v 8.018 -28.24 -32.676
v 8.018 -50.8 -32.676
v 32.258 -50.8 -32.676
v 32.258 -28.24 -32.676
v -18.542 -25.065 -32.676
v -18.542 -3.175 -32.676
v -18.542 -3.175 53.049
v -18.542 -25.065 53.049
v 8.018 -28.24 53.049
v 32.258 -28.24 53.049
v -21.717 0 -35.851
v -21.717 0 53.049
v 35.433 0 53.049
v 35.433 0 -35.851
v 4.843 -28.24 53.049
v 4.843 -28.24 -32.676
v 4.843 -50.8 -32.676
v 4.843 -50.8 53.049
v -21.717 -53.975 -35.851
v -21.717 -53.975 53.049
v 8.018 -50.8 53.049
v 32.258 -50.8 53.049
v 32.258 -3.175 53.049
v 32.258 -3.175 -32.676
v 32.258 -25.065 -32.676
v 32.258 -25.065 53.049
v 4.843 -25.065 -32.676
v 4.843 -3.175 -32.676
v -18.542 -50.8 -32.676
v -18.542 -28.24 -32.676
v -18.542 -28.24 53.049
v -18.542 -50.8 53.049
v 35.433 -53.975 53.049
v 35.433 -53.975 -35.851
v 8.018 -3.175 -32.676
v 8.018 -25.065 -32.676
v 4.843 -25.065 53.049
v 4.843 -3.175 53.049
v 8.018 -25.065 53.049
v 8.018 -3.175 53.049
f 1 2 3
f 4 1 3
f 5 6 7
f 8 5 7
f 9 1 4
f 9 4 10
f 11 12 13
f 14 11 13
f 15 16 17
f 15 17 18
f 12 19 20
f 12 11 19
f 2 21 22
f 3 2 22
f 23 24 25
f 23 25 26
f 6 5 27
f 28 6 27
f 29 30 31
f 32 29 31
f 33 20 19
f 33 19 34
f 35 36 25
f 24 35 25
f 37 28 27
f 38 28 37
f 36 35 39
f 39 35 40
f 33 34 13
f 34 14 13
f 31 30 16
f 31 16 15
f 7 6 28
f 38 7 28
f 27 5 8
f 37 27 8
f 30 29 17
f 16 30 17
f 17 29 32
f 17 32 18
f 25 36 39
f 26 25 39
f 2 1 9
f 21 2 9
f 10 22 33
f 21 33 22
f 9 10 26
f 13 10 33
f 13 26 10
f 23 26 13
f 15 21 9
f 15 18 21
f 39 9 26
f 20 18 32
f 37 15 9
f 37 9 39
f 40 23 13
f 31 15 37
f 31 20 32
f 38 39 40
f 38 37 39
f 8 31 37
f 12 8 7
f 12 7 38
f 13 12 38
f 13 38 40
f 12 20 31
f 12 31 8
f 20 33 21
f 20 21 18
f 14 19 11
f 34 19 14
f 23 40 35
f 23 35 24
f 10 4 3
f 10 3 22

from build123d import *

# Parameters (mm, degrees)
F0_W      = 57.15
F0_H      = 88.9
F1_DEPTH  = 3.175
F2_W      = 3.175
F2_H      = 88.9
F3_DEPTH  = 50.8
F4_W      = 3.175
F4_H      = 88.9
F5_DEPTH  = 50.8
F6_W      = 53.0491641998
F6_H      = 88.9
F7_DEPTH  = 3.175
F8_W      = 50.8
F8_H      = 47.625
F9_DEPTH  = 3.175
F11_W     = 50.8
F11_H     = 47.625
F12_DEPTH = 3.175
F13_W     = 3.175
F13_H     = 85.725
F14_DEPTH = 50.8
F15_W     = 3.175
F15_H     = 85.725
F16_DEPTH = 50.8


with BuildPart() as f1:
    # F0 (on Front) → F1 (new body)
    with BuildSketch(Plane.XZ):
        with Locations((6.8577993661, 8.5990129304)):
            Rectangle(F0_W, F0_H)
    extrude(amount=F1_DEPTH)

    # F2 (on face) → F3 (join)
    with BuildSketch(Plane.XZ.offset(3.175)):
        with Locations((-20.1297006339, 8.5990129304)):
            Rectangle(F2_W, F2_H)
    extrude(amount=F3_DEPTH)

    # F4 (on face) → F5 (join)
    with BuildSketch(Plane.XZ.offset(3.175)):
        with Locations((33.8452993661, 8.5990129304)):
            Rectangle(F4_W, F4_H)
    extrude(amount=F5_DEPTH)

    # F6 (on face) → F7 (join)
    with BuildSketch(Plane.XZ.offset(53.975)):
        with Locations((5.7332172662, 8.5990129304)):
            Rectangle(F6_W, F6_H)
    extrude(amount=-F7_DEPTH)

    # F11 (on face) → F12 (join)
    with BuildSketch(Plane(origin=(0, 0, -35.8509870696), x_dir=(1, 0, 0), z_dir=(0, 0, -1))):
        with Locations((6.8577993661, 26.9875)):
            Rectangle(F11_W, F11_H)
    extrude(amount=-F12_DEPTH)

    # F13 (on face) → F14 (join)
    with BuildSketch(Plane.XZ.offset(3.175)):
        with Locations((6.430921746, 10.1865129304)):
            Rectangle(F13_W, F13_H)
    extrude(amount=F14_DEPTH)

    # F15 (on face) → F16 (join)
    with BuildSketch(Plane.YZ.offset(-18.5422006339)):
        with Locations((-26.6523276031, 10.1865129304)):
            Rectangle(F15_W, F15_H)
    extrude(amount=F16_DEPTH)


with BuildPart() as f9:
    # F8 (on face) → F9 (new body)
    with BuildSketch(Plane(origin=(0, 0, -35.8509870696), x_dir=(1, 0, 0), z_dir=(0, 0, -1))):
        with Locations((6.8577993661, 26.9875)):
            Rectangle(F8_W, F8_H)
    extrude(amount=-F9_DEPTH)


solid = f1.part
